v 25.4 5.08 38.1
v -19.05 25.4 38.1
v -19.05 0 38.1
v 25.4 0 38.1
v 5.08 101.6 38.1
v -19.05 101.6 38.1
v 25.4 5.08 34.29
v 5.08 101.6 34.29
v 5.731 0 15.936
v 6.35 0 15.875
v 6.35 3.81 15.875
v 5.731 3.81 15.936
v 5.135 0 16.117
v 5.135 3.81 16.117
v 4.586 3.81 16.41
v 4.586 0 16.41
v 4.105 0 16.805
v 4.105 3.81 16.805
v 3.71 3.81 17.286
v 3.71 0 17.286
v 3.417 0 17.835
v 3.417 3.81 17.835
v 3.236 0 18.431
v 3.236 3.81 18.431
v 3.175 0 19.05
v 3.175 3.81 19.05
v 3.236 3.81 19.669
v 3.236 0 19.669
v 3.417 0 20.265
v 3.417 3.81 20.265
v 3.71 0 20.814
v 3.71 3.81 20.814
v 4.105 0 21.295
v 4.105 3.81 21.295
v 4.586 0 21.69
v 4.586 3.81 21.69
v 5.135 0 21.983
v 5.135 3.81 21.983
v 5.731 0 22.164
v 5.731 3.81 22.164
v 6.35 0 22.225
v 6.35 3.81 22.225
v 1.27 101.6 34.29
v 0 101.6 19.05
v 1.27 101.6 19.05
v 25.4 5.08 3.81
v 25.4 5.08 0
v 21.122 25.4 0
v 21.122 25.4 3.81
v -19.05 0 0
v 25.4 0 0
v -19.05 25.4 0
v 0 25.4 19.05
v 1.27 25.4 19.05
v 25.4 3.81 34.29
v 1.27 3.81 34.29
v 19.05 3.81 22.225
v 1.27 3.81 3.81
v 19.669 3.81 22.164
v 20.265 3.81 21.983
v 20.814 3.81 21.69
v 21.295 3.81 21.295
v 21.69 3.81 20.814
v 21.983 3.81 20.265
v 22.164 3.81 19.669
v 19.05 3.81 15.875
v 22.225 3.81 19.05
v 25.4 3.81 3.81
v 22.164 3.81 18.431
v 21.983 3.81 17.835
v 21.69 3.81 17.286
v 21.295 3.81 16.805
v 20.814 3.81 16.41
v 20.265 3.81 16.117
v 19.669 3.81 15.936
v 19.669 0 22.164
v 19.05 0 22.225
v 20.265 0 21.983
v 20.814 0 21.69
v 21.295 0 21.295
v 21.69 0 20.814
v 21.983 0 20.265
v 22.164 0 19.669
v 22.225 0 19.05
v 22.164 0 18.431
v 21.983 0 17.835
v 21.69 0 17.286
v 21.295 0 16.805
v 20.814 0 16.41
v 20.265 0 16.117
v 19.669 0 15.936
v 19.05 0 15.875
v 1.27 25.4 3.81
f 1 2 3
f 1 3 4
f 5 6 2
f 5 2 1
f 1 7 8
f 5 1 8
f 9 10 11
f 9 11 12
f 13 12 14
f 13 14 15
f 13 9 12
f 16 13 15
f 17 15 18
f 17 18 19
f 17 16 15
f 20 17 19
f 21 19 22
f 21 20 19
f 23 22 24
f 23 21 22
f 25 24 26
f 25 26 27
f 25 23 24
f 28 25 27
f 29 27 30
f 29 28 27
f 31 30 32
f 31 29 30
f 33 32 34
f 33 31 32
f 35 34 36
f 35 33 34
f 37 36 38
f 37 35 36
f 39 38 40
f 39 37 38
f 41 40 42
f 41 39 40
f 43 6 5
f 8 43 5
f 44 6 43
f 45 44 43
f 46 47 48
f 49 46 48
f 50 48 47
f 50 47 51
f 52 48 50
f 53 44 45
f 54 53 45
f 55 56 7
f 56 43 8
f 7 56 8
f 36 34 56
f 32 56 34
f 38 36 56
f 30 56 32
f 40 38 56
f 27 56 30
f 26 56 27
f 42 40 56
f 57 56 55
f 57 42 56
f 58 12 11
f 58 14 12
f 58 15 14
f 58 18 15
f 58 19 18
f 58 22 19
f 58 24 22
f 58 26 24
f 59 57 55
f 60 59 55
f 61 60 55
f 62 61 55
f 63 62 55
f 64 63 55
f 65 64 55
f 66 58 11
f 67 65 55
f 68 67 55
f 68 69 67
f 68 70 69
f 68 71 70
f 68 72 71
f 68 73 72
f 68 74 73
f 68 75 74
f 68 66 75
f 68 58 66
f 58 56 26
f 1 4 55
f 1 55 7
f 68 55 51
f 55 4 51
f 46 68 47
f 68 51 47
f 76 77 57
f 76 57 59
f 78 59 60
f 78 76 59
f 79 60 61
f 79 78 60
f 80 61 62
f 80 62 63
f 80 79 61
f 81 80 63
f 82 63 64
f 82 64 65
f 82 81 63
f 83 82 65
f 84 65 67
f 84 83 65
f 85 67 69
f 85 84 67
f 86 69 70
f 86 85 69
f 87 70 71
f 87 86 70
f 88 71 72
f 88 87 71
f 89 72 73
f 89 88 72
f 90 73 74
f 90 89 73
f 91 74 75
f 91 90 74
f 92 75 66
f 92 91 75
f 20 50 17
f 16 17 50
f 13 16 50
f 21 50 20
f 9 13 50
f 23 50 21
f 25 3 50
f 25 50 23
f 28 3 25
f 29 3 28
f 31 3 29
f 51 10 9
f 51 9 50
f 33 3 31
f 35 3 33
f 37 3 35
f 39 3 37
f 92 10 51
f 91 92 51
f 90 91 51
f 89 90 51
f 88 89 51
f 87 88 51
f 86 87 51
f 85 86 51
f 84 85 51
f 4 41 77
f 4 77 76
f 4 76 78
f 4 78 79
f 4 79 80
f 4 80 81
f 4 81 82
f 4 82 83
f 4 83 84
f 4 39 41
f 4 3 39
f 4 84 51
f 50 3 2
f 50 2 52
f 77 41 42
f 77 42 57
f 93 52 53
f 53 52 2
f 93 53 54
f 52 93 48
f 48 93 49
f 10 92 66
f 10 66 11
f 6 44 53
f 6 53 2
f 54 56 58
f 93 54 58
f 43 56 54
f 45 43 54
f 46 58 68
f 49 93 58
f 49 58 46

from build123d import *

# Parameters (mm, degrees)
BOSS_EXTRUDE1_DEPTH = 38.1
SHELL1_T            = -3.81
CUT_EXTRUDE1_DEPTH  = 3.81
BOSS_EXTRUDE2_DEPTH = 101.6
SKETCH5_W           = 24.13
SKETCH5_H           = 30.48
CUT_EXTRUDE2_DEPTH  = 97.79
BOSS_EXTRUDE3_DEPTH = 25.4
SKETCH9_W           = 44.45
SKETCH9_H           = 19.05
CUT_EXTRUDE4_DEPTH  = 76.2


with BuildPart() as part:
    # Sketch1 → Boss-Extrude1 (new body)
    with BuildSketch(Plane.XY):
        Polygon((0, 0), (25.4, 0), (25.4, 5.08), (5.08, 101.6), (0, 101.6), align=None)
    extrude(amount=BOSS_EXTRUDE1_DEPTH)

    # Shell1
    shell1_openings = [part.faces().sort_by_distance(p)[0] for p in [
        (15.24, 53.34, 19.05),
    ]]
    offset(amount=SHELL1_T, openings=shell1_openings, kind=Kind.INTERSECTION)

    # Sketch2 → Cut-Extrude1 (cut)
    with BuildSketch(Plane.XZ):
        with BuildLine():
            Line((6.35, 22.225), (19.05, 22.225))
            ThreePointArc((19.05, 22.225), (22.225, 19.05), (19.05, 15.875))
            Line((19.05, 15.875), (6.35, 15.875))
            ThreePointArc((6.35, 15.875), (3.175, 19.05), (6.35, 22.225))
        make_face()
    extrude(amount=-CUT_EXTRUDE1_DEPTH, mode=Mode.SUBTRACT)

    # Sketch3 → Boss-Extrude2 (add)
    with BuildSketch(Plane(origin=(0, 101.6, 0), x_dir=(1, 0, 0), z_dir=(0, 1, 0))):
        Polygon((-19.05, 0), (0, -19.05), (0, 0), align=None)
        Polygon((0, -38.1), (0, -19.05), (-19.05, -38.1), align=None)
    extrude(amount=-BOSS_EXTRUDE2_DEPTH)

    # Sketch5 → Cut-Extrude2 (cut)
    with BuildSketch(Plane(origin=(0, 101.6, 0), x_dir=(1, 0, 0), z_dir=(0, 1, 0))):
        with Locations((13.335, -19.05)):
            Rectangle(SKETCH5_W, SKETCH5_H)
    extrude(amount=-CUT_EXTRUDE2_DEPTH, mode=Mode.SUBTRACT)

    # Sketch6 → Boss-Extrude3 (add)
    with BuildSketch(Plane.XZ):
        Polygon((-19.05, 0), (0, 19.05), (-19.05, 38.1), align=None)
    extrude(amount=-BOSS_EXTRUDE3_DEPTH)

    # Sketch9 → Cut-Extrude4 (cut)
    with BuildSketch(Plane(origin=(0, 101.6, 0), x_dir=(1, 0, 0), z_dir=(0, 1, 0))):
        with Locations((3.175, -9.525)):
            Rectangle(SKETCH9_W, SKETCH9_H)
    extrude(amount=-CUT_EXTRUDE4_DEPTH, mode=Mode.SUBTRACT)


solid = part.part
